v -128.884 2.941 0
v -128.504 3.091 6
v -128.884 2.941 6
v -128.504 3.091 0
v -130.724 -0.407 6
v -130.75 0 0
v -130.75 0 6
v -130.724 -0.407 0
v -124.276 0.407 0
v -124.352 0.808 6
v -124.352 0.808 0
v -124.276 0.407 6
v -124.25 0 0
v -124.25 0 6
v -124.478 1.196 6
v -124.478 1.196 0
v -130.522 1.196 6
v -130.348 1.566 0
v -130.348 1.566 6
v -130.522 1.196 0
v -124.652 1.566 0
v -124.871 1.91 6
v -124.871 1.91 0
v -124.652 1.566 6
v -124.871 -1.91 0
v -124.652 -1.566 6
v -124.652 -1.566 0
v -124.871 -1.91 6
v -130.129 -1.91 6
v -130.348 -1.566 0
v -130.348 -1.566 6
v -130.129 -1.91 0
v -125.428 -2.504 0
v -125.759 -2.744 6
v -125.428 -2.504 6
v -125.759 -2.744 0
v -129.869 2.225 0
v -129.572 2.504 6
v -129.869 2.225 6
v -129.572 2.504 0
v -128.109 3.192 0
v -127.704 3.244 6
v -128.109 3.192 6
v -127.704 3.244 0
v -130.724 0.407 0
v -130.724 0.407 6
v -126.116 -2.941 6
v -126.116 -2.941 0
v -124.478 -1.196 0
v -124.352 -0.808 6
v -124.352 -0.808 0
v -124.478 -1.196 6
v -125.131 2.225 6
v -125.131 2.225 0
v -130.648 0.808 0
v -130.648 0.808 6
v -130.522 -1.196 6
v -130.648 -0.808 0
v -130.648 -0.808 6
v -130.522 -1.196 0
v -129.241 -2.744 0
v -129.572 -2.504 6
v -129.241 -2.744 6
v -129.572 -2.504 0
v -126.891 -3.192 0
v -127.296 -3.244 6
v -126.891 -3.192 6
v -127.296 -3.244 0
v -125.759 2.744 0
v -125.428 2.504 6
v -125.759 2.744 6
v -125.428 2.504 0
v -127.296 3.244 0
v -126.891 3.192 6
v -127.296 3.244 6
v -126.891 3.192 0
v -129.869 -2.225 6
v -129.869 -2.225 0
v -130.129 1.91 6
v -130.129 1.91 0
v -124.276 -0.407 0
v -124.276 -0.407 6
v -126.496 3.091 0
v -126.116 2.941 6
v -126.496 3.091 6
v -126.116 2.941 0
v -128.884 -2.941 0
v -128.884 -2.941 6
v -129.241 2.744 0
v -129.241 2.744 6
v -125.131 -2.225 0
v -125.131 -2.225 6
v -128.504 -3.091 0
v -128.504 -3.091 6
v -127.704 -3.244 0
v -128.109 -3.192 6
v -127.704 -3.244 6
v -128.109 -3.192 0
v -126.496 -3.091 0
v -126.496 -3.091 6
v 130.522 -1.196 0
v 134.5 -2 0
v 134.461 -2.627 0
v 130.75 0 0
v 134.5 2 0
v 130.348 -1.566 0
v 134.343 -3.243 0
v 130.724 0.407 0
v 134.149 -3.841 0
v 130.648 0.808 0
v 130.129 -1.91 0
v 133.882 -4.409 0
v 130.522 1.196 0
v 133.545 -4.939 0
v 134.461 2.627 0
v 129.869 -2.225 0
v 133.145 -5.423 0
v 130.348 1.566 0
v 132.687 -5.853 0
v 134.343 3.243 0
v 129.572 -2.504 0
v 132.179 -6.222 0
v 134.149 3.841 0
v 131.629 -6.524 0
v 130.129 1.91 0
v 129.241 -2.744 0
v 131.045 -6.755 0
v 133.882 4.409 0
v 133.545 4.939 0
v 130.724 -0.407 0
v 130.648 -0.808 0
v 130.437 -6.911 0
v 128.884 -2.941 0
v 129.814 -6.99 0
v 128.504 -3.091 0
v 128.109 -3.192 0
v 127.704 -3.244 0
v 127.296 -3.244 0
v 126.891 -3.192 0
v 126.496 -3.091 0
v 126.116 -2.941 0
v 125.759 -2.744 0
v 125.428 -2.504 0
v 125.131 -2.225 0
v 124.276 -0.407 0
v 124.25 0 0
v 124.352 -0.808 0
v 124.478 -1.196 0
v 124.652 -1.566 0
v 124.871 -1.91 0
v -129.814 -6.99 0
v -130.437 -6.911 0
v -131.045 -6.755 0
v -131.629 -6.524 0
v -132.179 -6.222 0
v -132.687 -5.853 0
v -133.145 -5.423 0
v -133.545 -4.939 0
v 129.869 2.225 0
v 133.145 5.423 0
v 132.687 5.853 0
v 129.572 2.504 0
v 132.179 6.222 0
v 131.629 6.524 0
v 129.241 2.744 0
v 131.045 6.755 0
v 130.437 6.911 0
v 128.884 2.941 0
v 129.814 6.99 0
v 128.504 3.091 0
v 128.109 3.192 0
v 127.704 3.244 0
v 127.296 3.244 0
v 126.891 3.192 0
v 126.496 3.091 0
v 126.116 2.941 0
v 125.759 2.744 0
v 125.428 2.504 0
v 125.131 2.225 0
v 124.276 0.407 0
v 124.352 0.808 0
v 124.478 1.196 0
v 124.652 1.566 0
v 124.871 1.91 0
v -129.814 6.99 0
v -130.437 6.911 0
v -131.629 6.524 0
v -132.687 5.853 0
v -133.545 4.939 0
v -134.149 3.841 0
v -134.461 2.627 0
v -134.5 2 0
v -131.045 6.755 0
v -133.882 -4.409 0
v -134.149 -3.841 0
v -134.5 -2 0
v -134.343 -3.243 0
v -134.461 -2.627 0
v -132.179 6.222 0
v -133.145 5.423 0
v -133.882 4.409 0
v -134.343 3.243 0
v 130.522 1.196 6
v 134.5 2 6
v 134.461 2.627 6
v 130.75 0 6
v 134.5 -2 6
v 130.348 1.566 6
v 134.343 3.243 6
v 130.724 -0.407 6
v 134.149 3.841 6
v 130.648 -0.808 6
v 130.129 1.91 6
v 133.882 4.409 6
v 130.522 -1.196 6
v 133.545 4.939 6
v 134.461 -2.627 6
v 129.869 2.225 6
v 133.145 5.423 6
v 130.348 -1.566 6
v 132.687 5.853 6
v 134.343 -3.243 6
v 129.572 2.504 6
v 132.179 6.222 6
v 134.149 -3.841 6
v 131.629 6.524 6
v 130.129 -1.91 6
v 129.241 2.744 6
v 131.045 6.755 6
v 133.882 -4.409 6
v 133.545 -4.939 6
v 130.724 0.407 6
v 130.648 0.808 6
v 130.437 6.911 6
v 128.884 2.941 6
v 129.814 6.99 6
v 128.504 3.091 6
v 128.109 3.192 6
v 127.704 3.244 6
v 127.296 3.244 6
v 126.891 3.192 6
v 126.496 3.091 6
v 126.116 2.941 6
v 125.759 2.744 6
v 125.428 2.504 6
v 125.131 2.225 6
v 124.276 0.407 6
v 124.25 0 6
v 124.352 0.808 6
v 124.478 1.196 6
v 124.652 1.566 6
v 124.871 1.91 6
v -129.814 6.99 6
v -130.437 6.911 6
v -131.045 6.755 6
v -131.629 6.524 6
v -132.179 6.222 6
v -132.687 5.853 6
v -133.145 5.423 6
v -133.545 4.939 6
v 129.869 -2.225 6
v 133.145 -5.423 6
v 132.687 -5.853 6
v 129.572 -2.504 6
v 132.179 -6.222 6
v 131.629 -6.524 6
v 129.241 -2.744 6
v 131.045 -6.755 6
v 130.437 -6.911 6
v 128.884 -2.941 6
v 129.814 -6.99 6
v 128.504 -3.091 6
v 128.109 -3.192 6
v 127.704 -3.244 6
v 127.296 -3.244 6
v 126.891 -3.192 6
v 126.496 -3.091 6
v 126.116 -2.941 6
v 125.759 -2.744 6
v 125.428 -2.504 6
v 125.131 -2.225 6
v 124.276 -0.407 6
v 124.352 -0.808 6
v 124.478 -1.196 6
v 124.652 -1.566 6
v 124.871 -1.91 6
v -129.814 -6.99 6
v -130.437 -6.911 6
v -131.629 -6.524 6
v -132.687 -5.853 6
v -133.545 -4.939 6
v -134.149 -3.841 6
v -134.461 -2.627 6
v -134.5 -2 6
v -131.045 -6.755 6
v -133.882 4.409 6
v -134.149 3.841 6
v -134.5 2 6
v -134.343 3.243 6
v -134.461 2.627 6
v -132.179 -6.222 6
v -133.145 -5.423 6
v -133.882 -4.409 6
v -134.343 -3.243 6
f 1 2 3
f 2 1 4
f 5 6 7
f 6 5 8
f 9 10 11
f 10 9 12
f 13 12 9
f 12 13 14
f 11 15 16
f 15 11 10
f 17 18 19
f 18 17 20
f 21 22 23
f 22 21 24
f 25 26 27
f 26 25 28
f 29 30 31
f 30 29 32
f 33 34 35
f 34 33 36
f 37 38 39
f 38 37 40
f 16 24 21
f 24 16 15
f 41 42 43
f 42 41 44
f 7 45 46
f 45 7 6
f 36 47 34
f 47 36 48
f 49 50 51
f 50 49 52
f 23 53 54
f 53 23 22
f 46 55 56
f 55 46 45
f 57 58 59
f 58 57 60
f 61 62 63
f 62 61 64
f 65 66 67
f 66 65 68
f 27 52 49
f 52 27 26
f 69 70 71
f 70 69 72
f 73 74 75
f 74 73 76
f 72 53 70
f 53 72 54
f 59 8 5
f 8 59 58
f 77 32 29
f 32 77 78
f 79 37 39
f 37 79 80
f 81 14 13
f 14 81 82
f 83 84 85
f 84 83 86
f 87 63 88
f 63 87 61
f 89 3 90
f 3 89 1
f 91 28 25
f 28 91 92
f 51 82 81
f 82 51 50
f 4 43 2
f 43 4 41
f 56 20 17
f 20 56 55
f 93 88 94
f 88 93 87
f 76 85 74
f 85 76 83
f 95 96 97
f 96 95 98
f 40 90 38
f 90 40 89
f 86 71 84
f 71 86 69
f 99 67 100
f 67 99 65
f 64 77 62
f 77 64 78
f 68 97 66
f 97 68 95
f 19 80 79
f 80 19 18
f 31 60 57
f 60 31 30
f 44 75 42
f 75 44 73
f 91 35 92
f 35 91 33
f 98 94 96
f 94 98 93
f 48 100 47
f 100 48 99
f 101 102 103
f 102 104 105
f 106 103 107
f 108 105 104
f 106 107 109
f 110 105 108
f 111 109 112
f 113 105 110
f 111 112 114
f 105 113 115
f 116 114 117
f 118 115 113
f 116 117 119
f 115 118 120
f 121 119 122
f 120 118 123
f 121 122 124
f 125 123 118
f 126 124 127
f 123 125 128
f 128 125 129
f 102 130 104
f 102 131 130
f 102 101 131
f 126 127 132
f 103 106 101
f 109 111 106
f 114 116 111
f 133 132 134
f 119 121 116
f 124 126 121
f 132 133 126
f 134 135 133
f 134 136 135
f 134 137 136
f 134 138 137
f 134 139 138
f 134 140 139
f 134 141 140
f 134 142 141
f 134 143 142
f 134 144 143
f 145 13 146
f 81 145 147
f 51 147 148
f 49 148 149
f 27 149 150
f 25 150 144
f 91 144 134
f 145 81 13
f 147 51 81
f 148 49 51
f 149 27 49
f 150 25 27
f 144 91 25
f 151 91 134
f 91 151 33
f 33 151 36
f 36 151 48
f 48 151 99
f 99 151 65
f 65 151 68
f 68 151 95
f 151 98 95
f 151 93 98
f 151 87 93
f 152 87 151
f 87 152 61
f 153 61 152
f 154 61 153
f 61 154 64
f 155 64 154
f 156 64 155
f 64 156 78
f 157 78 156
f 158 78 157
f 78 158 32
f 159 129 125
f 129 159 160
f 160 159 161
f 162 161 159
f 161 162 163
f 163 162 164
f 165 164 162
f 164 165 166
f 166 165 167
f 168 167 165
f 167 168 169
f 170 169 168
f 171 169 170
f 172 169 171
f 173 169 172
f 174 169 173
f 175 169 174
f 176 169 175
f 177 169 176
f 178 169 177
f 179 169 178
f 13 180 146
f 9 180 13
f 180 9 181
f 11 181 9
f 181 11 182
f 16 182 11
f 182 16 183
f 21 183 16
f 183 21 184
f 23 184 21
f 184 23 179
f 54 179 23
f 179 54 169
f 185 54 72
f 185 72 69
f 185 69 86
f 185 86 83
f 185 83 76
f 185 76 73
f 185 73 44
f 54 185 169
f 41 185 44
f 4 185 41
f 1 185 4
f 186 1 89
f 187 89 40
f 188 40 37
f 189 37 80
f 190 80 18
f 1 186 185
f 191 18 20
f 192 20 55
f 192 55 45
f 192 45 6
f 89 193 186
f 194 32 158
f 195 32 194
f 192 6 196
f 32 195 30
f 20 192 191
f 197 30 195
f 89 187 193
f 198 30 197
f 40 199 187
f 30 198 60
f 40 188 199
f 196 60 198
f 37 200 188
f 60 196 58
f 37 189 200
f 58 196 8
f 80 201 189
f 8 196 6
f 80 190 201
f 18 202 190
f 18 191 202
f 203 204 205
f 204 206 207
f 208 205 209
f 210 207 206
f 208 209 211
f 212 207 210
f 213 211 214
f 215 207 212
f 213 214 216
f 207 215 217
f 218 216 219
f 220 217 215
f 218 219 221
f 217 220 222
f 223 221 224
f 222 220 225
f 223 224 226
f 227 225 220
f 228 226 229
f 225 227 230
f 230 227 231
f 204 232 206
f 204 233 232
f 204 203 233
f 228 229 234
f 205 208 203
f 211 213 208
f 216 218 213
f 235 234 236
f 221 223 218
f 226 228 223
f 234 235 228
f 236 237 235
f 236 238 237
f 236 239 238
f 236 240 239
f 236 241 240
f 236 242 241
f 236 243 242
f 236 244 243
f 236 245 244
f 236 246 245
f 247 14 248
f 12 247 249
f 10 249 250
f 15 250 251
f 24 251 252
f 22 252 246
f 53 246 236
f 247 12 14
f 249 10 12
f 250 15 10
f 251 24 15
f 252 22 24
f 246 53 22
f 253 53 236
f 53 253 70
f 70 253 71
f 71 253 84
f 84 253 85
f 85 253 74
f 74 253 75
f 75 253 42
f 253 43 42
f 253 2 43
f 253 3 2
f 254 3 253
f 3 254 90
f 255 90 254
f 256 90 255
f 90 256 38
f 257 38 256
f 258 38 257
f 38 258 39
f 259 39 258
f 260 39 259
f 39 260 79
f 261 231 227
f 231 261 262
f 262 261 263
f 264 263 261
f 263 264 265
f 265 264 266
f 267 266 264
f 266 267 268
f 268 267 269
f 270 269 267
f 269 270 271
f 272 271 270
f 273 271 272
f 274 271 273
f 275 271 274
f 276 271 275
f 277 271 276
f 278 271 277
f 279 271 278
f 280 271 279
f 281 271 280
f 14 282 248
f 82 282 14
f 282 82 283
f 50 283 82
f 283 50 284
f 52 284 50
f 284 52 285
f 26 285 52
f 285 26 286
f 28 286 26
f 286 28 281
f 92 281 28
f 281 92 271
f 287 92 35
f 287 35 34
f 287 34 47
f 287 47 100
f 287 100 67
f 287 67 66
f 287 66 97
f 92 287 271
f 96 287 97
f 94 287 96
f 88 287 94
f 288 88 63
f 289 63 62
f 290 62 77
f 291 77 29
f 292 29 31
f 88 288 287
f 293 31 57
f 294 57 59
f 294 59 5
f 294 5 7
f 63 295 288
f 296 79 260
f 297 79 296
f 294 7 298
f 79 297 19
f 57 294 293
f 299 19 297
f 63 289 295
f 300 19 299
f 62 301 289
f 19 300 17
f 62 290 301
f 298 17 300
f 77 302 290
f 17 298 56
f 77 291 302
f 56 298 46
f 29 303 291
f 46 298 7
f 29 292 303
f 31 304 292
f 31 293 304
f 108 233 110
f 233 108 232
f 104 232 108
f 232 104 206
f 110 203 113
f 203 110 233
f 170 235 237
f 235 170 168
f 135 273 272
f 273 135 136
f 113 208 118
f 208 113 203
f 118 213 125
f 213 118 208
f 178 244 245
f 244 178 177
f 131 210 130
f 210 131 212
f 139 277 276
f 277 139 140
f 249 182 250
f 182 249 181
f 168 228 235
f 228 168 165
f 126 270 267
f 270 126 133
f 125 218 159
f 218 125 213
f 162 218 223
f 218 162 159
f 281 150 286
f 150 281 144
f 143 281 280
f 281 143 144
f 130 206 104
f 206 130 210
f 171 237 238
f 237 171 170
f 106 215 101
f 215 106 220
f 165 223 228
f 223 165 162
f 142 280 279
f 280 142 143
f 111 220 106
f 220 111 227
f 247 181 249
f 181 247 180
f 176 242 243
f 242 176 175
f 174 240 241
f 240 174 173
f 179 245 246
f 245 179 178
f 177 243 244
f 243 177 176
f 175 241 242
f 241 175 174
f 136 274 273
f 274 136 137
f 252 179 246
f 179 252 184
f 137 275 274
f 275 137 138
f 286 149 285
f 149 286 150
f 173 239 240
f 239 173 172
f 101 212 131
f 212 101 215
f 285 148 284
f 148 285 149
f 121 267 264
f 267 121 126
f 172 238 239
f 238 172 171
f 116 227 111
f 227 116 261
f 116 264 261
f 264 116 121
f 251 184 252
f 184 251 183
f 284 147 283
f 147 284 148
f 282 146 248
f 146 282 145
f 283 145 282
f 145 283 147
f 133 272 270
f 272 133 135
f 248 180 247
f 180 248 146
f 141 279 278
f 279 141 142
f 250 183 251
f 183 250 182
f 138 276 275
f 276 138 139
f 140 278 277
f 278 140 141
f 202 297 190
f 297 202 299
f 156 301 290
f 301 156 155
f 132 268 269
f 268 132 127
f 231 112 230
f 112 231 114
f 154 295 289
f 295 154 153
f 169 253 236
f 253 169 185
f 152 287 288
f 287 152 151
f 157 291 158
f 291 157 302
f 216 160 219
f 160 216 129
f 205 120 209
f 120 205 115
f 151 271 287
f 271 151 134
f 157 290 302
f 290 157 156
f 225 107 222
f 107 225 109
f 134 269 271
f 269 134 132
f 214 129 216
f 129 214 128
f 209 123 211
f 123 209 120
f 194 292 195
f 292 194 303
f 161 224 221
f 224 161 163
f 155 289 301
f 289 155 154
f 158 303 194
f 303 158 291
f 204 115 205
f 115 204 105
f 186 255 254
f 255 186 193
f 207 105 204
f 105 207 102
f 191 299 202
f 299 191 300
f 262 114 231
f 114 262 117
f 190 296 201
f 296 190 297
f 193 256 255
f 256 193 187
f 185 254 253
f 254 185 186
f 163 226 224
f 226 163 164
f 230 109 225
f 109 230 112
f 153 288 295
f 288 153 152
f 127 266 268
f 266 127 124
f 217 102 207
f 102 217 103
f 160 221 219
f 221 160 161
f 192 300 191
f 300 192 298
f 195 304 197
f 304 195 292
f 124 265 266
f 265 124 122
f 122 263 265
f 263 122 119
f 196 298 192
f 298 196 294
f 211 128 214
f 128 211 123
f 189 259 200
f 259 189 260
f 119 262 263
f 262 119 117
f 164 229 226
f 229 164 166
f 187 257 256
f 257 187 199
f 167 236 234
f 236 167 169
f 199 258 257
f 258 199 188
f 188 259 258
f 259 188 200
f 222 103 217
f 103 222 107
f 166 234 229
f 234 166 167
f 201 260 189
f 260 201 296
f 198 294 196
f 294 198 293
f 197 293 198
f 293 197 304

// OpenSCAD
$fn = 50;


difference() {
	union() {
		hull() {
			translate(v = [-129.5000000000, 2.0000000000, 0]) {
				cylinder(h = 6, r = 5);
			}
			translate(v = [129.5000000000, 2.0000000000, 0]) {
				cylinder(h = 6, r = 5);
			}
			translate(v = [-129.5000000000, -2.0000000000, 0]) {
				cylinder(h = 6, r = 5);
			}
			translate(v = [129.5000000000, -2.0000000000, 0]) {
				cylinder(h = 6, r = 5);
			}
		}
	}
	union() {
		translate(v = [-127.5000000000, 0.0000000000, 0]) {
			cylinder(h = 6, r = 3.2500000000);
		}
		translate(v = [127.5000000000, 0.0000000000, 0]) {
			cylinder(h = 6, r = 3.2500000000);
		}
		translate(v = [-127.5000000000, 0.0000000000, 0]) {
			cylinder(h = 6, r = 1.8000000000);
		}
		translate(v = [127.5000000000, 0.0000000000, 0]) {
			cylinder(h = 6, r = 1.8000000000);
		}
		translate(v = [-127.5000000000, 0.0000000000, 0]) {
			cylinder(h = 6, r = 1.8000000000);
		}
		translate(v = [127.5000000000, 0.0000000000, 0]) {
			cylinder(h = 6, r = 1.8000000000);
		}
		translate(v = [-127.5000000000, 0.0000000000, 0]) {
			cylinder(h = 6, r = 1.8000000000);
		}
		translate(v = [127.5000000000, 0.0000000000, 0]) {
			cylinder(h = 6, r = 1.8000000000);
		}
	}
}
